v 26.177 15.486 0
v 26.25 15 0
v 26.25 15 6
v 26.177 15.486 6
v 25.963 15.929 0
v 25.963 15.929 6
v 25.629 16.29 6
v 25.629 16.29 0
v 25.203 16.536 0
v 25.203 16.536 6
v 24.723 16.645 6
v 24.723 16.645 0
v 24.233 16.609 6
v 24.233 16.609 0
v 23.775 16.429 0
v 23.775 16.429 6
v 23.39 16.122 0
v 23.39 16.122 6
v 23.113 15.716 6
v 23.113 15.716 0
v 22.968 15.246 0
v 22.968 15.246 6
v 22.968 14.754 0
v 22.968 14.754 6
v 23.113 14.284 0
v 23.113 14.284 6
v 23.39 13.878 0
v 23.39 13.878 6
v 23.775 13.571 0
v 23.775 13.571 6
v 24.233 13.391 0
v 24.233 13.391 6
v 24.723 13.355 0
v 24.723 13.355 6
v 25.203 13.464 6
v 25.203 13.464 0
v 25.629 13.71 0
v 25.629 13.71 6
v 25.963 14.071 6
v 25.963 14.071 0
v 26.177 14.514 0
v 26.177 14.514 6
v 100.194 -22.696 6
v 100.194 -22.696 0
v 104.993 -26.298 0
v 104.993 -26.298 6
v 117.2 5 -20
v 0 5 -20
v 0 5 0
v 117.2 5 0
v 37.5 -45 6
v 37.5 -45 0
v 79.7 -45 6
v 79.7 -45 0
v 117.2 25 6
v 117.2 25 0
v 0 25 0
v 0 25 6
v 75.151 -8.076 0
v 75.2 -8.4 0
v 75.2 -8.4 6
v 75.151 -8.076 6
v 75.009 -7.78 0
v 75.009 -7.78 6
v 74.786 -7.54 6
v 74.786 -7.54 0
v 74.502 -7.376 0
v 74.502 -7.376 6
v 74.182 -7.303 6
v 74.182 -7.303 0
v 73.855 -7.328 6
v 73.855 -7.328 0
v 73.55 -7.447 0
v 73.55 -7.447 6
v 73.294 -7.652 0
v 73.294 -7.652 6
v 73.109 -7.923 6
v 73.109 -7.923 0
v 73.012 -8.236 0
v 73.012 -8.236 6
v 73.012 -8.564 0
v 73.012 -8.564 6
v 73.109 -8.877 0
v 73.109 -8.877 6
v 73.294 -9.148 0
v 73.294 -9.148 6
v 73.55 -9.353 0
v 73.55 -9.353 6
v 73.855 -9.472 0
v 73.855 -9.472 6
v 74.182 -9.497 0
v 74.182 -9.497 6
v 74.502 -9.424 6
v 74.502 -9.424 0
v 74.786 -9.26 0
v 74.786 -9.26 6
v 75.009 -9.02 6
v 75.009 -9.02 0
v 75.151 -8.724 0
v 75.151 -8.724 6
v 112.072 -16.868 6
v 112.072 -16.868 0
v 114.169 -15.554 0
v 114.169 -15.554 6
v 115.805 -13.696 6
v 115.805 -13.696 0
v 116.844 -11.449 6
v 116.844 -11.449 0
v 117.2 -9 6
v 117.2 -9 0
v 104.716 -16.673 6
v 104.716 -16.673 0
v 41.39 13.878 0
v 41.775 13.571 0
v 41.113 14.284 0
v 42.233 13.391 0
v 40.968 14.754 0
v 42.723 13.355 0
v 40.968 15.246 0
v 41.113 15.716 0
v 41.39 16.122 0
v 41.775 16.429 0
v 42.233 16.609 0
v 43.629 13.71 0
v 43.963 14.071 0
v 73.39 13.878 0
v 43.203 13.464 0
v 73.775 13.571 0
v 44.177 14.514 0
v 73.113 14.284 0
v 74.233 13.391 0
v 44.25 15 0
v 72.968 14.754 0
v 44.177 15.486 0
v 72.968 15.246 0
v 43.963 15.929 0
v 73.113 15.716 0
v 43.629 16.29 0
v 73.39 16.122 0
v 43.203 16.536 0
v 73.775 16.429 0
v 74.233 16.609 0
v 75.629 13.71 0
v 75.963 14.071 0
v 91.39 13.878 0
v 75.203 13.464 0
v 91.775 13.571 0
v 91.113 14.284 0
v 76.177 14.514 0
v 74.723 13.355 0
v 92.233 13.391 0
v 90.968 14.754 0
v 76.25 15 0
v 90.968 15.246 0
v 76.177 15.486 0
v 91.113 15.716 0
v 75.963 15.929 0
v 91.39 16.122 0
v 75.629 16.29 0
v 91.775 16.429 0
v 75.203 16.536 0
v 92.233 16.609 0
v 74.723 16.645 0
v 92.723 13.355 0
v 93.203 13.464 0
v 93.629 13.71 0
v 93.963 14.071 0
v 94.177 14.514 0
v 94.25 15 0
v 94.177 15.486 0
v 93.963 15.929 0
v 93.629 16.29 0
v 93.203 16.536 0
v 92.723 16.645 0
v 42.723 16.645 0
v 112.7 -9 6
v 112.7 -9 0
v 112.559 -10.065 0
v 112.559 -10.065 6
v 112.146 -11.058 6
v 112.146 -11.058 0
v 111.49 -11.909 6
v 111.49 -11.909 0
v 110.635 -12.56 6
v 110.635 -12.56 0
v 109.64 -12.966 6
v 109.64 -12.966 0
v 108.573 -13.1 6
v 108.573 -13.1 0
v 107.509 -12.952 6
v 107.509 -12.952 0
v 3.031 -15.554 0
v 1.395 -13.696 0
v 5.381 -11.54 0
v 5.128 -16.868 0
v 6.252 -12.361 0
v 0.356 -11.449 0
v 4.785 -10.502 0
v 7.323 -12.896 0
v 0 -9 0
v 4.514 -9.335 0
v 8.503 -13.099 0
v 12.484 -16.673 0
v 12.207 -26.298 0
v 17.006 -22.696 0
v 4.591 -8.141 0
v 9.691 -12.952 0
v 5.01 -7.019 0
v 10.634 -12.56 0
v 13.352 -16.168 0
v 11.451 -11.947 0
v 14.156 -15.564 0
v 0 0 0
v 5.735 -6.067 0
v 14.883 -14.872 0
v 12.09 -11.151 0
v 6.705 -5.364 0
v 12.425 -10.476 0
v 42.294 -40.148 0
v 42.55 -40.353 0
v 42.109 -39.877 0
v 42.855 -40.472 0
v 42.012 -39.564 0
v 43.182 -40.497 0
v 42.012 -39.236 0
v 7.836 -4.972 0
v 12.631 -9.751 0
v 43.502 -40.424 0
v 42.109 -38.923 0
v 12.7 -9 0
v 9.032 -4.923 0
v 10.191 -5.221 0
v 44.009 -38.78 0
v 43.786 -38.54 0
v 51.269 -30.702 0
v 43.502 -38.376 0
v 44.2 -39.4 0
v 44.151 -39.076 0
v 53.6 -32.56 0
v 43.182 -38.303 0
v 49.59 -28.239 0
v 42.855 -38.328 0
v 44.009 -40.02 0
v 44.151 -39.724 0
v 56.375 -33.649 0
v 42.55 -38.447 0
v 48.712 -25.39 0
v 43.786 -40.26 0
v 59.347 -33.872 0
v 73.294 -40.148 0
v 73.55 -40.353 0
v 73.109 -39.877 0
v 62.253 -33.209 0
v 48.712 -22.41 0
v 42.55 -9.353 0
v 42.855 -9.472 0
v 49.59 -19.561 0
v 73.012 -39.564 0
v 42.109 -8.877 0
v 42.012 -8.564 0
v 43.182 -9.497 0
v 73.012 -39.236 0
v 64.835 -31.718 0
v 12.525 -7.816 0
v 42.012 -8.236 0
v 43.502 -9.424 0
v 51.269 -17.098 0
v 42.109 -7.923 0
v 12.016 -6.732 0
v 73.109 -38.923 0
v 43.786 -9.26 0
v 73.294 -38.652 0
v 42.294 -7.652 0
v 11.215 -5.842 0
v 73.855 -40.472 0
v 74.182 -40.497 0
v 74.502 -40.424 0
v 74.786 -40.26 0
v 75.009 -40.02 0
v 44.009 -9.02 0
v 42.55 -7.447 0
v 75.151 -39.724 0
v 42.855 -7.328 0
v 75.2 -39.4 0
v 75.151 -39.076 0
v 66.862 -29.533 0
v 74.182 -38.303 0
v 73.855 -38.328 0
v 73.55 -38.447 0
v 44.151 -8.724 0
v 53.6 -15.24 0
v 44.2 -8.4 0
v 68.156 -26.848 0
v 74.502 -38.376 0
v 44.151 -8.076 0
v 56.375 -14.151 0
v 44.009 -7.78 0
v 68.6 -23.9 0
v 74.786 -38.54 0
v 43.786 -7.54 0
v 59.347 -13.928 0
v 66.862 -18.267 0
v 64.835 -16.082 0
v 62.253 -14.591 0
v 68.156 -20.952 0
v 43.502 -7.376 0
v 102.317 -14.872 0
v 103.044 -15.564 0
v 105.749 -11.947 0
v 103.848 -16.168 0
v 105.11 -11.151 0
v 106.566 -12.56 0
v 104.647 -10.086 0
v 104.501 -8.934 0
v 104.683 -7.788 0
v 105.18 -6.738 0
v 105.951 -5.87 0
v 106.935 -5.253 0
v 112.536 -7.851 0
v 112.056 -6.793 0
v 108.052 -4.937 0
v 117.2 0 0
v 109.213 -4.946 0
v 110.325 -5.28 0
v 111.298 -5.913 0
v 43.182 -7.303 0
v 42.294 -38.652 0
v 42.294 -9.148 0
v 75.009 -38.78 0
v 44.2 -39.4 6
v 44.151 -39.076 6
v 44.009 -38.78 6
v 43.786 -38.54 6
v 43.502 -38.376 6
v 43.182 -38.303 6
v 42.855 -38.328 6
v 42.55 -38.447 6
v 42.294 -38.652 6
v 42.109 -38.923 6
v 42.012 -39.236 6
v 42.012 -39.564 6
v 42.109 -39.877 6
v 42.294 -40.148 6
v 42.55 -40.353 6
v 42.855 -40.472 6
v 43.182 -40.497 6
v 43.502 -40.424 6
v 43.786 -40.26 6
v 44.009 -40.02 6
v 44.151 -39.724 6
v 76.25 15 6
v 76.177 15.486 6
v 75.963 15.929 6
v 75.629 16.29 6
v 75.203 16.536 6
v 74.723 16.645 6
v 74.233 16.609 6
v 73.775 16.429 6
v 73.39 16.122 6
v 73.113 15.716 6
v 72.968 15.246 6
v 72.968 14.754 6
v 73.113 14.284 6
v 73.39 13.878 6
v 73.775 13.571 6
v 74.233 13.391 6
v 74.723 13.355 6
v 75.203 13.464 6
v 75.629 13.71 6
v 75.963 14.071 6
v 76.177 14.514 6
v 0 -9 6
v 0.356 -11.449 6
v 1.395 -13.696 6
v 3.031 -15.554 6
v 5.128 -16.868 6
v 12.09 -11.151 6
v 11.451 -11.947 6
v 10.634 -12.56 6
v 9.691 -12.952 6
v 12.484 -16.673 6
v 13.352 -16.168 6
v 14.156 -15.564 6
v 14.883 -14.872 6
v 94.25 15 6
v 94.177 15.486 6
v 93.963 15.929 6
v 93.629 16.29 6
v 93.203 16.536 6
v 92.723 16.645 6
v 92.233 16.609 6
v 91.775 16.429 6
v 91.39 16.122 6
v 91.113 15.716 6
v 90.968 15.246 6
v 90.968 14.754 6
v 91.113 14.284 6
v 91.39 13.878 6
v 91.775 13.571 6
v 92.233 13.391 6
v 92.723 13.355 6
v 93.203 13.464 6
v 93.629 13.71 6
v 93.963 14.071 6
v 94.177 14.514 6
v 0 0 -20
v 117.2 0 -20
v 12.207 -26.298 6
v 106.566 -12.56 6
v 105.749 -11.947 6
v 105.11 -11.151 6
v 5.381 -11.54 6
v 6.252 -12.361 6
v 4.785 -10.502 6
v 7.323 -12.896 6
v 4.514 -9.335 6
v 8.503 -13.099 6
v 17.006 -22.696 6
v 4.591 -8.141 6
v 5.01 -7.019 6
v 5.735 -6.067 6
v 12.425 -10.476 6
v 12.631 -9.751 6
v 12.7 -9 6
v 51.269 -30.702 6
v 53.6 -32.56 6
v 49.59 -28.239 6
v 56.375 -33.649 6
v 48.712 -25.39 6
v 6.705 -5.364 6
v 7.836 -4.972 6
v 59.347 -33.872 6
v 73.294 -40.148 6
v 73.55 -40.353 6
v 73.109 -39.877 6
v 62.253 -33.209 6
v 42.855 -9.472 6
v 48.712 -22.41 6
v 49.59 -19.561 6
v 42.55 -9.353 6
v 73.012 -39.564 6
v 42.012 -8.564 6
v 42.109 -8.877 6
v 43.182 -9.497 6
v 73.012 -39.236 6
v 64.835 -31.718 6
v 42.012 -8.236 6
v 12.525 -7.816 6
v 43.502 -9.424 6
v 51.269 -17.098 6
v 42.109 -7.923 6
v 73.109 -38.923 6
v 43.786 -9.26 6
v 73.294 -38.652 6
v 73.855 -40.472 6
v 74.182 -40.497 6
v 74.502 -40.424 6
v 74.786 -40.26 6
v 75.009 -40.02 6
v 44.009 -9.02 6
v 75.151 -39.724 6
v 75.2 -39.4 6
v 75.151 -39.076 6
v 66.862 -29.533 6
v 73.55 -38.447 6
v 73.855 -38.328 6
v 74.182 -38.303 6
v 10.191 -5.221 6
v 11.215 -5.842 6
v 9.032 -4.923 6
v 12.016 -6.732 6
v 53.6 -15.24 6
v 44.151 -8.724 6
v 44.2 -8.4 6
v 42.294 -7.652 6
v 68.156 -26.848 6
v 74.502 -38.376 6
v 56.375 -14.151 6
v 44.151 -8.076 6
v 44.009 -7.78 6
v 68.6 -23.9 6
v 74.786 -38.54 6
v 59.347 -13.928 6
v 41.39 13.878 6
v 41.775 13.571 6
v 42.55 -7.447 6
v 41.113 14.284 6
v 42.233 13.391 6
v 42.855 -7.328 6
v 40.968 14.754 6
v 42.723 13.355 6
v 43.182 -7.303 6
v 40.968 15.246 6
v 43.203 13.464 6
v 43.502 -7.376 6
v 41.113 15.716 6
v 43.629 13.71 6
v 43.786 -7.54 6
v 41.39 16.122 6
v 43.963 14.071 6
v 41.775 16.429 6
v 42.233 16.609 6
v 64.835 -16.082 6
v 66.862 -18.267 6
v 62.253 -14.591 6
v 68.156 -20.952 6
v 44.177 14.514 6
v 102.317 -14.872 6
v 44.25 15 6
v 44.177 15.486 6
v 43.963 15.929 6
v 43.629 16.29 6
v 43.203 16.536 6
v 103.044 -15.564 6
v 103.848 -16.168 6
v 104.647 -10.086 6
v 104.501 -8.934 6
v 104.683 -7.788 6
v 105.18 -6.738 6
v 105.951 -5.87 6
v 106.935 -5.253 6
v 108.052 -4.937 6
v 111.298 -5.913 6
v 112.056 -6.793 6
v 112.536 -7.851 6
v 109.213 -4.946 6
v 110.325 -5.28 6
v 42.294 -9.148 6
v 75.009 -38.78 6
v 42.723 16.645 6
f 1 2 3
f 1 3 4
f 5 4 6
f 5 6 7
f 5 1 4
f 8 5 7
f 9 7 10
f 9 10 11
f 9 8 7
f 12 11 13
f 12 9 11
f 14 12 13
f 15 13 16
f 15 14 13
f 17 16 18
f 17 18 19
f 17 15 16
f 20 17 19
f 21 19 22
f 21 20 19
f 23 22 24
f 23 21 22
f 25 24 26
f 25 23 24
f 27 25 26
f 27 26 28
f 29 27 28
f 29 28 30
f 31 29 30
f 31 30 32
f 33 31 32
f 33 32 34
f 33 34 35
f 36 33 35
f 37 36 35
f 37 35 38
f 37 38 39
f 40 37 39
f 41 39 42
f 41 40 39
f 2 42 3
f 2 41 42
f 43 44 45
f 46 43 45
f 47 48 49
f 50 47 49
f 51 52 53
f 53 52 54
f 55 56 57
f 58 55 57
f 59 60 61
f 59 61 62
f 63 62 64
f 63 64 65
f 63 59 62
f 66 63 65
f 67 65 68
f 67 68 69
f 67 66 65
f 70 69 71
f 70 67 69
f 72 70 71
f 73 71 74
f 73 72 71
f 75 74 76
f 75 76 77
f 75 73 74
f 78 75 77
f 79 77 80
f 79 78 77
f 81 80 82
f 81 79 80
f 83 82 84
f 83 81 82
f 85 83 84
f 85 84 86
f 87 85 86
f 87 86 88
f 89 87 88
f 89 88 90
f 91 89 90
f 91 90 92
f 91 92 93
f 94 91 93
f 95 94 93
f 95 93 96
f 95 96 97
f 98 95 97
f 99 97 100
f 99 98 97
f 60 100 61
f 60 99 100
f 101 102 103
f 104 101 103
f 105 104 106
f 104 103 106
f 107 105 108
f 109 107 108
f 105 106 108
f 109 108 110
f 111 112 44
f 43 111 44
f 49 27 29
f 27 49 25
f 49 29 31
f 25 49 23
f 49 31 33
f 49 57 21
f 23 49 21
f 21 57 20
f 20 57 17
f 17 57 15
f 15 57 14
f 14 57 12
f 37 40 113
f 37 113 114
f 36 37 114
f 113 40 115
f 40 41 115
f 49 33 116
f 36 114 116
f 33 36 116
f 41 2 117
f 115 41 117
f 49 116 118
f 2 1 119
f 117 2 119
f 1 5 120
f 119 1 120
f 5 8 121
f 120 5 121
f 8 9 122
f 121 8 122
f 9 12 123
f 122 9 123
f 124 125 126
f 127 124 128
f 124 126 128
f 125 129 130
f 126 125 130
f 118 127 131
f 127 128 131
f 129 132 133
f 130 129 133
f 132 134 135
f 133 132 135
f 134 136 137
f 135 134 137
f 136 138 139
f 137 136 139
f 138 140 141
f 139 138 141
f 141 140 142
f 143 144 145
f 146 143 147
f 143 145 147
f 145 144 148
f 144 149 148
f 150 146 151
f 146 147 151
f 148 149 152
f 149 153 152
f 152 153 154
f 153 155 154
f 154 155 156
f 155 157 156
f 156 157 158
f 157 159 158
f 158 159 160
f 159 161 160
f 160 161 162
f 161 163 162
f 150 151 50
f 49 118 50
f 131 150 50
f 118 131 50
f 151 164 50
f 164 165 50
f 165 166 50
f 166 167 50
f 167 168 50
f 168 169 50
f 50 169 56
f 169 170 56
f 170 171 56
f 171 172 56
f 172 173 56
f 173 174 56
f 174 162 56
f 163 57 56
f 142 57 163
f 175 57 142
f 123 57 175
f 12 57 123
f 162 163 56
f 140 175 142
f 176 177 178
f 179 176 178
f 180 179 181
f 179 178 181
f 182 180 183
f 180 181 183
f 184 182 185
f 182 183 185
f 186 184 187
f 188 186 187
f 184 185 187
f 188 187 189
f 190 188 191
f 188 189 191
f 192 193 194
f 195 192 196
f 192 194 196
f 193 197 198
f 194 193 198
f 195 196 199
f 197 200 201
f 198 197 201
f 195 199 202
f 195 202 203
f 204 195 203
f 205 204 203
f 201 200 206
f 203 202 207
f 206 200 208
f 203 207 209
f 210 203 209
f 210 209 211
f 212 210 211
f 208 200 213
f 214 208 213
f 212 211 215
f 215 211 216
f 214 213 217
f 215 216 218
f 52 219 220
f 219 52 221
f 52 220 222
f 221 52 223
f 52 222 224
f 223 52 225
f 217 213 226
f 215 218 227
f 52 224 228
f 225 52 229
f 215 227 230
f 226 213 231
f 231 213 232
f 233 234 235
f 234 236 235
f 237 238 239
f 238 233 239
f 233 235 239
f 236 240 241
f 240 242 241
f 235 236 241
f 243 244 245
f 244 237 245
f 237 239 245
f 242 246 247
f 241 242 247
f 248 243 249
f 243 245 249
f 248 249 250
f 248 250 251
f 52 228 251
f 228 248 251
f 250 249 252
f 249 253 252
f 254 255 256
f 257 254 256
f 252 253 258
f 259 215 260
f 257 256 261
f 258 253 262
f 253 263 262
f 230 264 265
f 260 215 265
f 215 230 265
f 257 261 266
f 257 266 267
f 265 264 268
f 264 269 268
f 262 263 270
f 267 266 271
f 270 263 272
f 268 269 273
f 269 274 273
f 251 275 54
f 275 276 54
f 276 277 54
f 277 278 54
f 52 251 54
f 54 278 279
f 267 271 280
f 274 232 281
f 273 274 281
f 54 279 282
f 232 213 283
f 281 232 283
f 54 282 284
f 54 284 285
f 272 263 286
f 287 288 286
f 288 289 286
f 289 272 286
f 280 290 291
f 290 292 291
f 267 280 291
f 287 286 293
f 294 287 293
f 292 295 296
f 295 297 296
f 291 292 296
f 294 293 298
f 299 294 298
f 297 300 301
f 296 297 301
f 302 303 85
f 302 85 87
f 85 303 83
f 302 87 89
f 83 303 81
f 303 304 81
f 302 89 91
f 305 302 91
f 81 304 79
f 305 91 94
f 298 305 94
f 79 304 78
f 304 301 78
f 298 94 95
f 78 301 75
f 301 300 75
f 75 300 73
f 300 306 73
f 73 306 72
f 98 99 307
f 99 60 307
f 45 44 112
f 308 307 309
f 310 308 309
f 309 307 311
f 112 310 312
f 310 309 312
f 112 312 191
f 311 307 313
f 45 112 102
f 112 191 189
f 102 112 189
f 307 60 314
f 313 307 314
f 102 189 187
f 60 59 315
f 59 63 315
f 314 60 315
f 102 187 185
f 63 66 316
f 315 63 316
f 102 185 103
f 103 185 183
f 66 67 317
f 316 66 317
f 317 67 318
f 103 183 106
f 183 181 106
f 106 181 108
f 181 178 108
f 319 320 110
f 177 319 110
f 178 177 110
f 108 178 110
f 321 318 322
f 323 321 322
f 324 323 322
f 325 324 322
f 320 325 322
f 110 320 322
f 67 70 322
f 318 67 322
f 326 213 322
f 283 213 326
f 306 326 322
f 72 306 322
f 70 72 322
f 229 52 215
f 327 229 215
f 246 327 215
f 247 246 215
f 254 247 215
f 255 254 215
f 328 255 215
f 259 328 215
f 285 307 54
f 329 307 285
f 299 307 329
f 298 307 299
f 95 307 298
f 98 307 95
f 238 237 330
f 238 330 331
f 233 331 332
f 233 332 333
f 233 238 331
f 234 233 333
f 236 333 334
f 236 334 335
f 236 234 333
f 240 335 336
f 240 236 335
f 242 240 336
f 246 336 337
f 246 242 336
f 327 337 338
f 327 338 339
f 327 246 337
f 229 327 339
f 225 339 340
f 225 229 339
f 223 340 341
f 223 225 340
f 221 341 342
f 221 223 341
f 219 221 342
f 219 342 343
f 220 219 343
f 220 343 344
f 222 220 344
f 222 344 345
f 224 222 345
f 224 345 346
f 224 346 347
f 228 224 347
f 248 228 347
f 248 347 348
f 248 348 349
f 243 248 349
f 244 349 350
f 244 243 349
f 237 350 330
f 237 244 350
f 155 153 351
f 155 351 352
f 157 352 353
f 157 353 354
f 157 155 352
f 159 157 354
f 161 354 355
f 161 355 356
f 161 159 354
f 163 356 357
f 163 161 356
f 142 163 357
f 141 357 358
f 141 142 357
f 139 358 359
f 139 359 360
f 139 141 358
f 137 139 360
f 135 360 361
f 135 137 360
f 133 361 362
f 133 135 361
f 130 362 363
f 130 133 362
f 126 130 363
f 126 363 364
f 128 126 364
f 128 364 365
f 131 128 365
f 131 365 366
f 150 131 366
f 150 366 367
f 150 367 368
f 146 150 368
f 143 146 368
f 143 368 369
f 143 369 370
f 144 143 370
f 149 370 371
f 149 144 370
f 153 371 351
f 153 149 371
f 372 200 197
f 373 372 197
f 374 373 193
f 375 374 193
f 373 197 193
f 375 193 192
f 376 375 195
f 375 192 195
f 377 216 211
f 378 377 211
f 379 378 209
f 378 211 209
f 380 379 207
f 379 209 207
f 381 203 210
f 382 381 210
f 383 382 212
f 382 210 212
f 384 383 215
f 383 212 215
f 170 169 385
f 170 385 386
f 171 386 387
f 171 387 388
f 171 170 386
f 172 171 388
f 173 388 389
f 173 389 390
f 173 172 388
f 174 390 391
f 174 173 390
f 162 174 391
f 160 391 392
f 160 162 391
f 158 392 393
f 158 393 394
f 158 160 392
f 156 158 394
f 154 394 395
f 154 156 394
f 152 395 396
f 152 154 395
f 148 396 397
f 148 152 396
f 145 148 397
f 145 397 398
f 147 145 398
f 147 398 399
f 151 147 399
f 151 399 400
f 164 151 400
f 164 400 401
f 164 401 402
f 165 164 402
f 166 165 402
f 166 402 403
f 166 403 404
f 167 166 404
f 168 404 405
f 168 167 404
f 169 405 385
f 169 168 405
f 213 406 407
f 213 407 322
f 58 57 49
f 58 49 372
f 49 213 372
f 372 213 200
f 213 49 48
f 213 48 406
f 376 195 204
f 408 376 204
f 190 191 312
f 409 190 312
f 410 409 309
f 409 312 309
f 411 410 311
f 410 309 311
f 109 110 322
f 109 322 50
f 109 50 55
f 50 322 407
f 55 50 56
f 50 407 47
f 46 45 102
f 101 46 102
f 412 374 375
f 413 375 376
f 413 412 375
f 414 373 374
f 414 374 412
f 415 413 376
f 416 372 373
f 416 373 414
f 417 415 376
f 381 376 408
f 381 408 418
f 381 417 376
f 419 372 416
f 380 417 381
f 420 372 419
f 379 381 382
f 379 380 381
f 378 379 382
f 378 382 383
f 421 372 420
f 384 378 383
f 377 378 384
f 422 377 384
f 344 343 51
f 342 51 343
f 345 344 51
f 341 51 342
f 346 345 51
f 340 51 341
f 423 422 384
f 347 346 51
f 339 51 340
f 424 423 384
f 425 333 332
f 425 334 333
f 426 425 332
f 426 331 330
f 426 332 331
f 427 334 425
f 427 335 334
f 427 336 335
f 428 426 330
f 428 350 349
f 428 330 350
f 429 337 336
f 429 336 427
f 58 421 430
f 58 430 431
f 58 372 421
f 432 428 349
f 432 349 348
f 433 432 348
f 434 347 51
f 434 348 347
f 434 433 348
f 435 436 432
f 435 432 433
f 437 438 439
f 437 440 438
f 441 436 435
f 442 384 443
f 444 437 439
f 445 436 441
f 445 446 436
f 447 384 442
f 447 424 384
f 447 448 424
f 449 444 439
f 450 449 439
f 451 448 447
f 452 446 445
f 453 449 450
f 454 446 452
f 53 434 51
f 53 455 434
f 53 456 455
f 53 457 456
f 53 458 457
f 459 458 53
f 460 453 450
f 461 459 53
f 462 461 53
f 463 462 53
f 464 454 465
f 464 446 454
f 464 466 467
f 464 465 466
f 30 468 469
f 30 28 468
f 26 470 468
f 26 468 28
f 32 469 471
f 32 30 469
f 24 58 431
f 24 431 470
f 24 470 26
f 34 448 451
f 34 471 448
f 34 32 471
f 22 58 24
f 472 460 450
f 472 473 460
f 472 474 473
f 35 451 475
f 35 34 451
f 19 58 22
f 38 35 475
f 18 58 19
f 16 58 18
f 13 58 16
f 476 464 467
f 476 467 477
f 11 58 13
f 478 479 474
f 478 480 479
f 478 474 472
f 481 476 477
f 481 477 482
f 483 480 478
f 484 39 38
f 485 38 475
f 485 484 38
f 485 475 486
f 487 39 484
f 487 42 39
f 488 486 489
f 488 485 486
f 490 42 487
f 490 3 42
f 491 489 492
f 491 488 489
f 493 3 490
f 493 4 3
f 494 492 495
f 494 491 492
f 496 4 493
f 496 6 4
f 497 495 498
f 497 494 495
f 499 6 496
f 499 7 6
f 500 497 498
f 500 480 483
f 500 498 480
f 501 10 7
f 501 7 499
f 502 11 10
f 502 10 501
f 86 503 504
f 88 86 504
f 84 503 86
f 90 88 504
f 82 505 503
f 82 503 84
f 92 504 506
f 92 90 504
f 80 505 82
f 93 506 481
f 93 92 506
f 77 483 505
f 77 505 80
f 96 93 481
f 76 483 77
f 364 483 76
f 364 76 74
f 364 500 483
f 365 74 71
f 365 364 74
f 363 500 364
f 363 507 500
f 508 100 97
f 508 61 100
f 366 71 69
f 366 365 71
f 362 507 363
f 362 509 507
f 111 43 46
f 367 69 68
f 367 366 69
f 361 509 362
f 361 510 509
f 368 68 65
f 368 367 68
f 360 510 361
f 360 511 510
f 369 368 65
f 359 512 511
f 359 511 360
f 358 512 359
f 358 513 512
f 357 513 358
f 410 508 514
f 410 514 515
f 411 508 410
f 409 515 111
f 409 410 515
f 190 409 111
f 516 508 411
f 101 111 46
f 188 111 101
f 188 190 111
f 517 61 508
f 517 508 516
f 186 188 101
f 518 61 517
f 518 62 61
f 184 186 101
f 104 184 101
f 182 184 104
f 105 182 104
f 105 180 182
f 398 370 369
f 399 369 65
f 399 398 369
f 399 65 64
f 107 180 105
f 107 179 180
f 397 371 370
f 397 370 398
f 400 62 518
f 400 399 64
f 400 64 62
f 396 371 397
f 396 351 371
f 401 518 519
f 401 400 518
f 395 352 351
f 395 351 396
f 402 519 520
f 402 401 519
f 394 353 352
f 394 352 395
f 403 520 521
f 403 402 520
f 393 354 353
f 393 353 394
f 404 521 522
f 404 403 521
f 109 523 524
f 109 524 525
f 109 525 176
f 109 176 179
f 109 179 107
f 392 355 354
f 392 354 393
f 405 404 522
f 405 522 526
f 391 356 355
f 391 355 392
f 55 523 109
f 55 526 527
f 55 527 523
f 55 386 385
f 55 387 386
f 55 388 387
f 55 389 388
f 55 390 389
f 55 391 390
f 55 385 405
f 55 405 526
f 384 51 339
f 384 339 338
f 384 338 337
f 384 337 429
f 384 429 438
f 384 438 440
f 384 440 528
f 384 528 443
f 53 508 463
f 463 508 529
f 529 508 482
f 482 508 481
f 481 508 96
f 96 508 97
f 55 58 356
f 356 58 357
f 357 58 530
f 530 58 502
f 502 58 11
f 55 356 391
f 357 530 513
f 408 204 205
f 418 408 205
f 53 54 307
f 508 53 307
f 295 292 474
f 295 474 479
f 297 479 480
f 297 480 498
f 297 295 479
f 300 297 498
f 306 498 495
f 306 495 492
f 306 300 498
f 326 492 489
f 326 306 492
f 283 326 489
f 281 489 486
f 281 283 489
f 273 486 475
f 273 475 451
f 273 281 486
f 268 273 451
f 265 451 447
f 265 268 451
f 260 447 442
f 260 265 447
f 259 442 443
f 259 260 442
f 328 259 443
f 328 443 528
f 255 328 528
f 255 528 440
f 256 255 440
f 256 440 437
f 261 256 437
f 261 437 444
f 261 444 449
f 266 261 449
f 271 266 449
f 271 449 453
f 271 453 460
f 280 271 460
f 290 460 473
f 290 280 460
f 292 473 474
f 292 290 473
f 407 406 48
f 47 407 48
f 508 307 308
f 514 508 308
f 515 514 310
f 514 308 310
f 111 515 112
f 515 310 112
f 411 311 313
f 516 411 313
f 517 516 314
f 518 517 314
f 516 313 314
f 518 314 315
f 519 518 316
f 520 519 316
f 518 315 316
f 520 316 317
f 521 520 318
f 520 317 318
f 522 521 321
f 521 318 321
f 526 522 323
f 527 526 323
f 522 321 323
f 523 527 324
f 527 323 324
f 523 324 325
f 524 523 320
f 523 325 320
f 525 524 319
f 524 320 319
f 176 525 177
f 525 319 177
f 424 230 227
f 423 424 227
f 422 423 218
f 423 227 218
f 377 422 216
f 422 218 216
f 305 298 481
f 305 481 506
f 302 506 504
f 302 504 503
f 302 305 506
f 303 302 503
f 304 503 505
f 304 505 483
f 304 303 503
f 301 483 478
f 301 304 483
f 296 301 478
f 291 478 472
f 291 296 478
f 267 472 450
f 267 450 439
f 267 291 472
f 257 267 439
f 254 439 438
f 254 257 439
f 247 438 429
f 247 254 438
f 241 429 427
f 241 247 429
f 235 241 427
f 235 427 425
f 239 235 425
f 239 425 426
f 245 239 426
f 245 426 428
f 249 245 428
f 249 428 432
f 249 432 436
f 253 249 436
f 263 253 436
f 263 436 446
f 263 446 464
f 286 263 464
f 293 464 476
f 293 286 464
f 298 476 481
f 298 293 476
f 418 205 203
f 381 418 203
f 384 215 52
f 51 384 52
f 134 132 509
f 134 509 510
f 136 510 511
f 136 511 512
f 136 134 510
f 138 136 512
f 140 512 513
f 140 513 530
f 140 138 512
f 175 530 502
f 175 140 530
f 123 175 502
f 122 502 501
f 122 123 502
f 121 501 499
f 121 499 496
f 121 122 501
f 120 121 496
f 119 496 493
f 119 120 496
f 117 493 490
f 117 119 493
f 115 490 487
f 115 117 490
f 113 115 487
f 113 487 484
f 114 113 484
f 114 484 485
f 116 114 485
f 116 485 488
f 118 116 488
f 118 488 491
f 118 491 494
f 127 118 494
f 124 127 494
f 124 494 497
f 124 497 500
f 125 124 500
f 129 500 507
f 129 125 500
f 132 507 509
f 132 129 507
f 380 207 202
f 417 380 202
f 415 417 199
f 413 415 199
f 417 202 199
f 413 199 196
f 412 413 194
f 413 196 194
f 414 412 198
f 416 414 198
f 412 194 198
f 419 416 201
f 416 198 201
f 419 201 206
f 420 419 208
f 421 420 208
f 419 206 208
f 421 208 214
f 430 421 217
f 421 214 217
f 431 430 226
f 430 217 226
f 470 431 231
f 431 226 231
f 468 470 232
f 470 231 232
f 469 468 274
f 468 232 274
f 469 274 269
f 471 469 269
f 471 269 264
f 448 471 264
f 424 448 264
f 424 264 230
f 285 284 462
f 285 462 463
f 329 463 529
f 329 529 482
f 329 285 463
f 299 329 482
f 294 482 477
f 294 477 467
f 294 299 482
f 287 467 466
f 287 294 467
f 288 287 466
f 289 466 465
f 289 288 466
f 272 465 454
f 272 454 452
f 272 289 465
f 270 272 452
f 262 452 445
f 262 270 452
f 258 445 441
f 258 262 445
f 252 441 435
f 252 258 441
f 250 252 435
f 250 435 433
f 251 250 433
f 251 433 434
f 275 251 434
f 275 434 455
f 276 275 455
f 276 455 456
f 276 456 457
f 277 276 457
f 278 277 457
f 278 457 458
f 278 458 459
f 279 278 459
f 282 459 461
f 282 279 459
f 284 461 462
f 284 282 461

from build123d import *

# Parameters (mm, degrees)
F0_R     = 1.1
F0_R_2   = 10
F0_R_3   = 1.65
F1_DEPTH = 6
F2_W     = 5
F2_H     = 20
F3_DEPTH = 117.2


with BuildPart() as f1:
    # F0 (on Top) → F1 (new body)
    with BuildSketch(Plane.XY):
        with BuildLine():
            Line((0, 25), (0, 0))
            Line((0, 0), (0, -9))
            ThreePointArc((0, -9), (8.6, -0.4), (17.2, -9))
            ThreePointArc((17.2, -9), (16.5999275153, -12.1561305026), (14.8834512211, -14.8718174999))
            Line((14.8834512211, -14.8718174999), (37.5, -45))
            Line((37.5, -45), (79.7, -45))
            Line((79.7, -45), (102.3165487789, -14.8718174999))
            ThreePointArc((102.3165487789, -14.8718174999), (105.4438694974, -1.0000724847), (117.2, -9))
            Line((117.2, -9), (117.2, 25))
            Line((117.2, 25), (0, 25))
        make_face()
        with Locations((43.1, -39.4)):
            Circle(F0_R, mode=Mode.SUBTRACT)
        with Locations((74.1, -39.4)):
            Circle(F0_R, mode=Mode.SUBTRACT)
        with Locations((58.6, -23.9)):
            Circle(F0_R_2, mode=Mode.SUBTRACT)
        with Locations((43.1, -8.4)):
            Circle(F0_R, mode=Mode.SUBTRACT)
        with Locations((24.6, 15)):
            Circle(F0_R_3, mode=Mode.SUBTRACT)
        with Locations((42.6, 15)):
            Circle(F0_R_3, mode=Mode.SUBTRACT)
        with Locations((74.1, -8.4)):
            Circle(F0_R, mode=Mode.SUBTRACT)
        with Locations((74.6, 15)):
            Circle(F0_R_3, mode=Mode.SUBTRACT)
        with Locations((92.6, 15)):
            Circle(F0_R_3, mode=Mode.SUBTRACT)
        with BuildLine():
            ThreePointArc((17.2, -9), (8.6, -0.4), (0, -9))
            ThreePointArc((0, -9), (1.3952892231, -13.6959708922), (5.1284052606, -16.8681656036))
            ThreePointArc((5.1284052606, -16.8681656036), (8.8282621536, -17.5969701866), (12.484231675, -16.6728576355))
            Line((12.484231675, -16.6728576355), (9.6911672785, -12.9521328381))
            ThreePointArc((9.6911672785, -12.9521328381), (5.3378085708, -6.5164325902), (12.7, -9))
            ThreePointArc((12.7, -9), (12.5446537225, -10.1179029518), (12.0903868245, -11.1510927026))
            Line((12.0903868245, -11.1510927026), (14.8834512211, -14.8718174999))
            ThreePointArc((14.8834512211, -14.8718174999), (16.5999275153, -12.1561305026), (17.2, -9))
        make_face()
        with BuildLine():
            ThreePointArc((12.484231675, -16.6728576355), (8.8282621536, -17.5969701866), (5.1284052606, -16.8681656036))
            Line((5.1284052606, -16.8681656036), (12.2074985246, -26.2984379178))
            Line((12.2074985246, -26.2984379178), (17.0059376167, -22.6963576466))
            Line((17.0059376167, -22.6963576466), (12.484231675, -16.6728576355))
        make_face()
        with BuildLine():
            ThreePointArc((112.0715947394, -16.8681656036), (115.8047107769, -13.6959708922), (117.2, -9))
            ThreePointArc((117.2, -9), (105.4438694974, -1.0000724847), (102.3165487789, -14.8718174999))
            Line((102.3165487789, -14.8718174999), (105.1096131755, -11.1510927026))
            ThreePointArc((105.1096131755, -11.1510927026), (107.4820970482, -5.0553462775), (112.7, -9))
            ThreePointArc((112.7, -9), (111.0835674098, -12.2621914292), (107.5088327215, -12.9521328381))
            Line((107.5088327215, -12.9521328381), (104.715768325, -16.6728576355))
            ThreePointArc((104.715768325, -16.6728576355), (108.3717378464, -17.5969701866), (112.0715947394, -16.8681656036))
        make_face()
        with BuildLine():
            ThreePointArc((12.484231675, -16.6728576355), (13.762981722, -15.8777626986), (14.8834512211, -14.8718174999))
            Line((14.8834512211, -14.8718174999), (12.0903868245, -11.1510927026))
            ThreePointArc((12.0903868245, -11.1510927026), (11.0614215186, -12.2789333796), (9.6911672785, -12.9521328381))
            Line((9.6911672785, -12.9521328381), (12.484231675, -16.6728576355))
        make_face()
        with BuildLine():
            Line((105.1096131755, -11.1510927026), (102.3165487789, -14.8718174999))
            ThreePointArc((102.3165487789, -14.8718174999), (103.437018278, -15.8777626986), (104.715768325, -16.6728576355))
            Line((104.715768325, -16.6728576355), (107.5088327215, -12.9521328381))
            ThreePointArc((107.5088327215, -12.9521328381), (106.1385784814, -12.2789333796), (105.1096131755, -11.1510927026))
        make_face()
        with BuildLine():
            Line((104.9925014754, -26.2984379178), (112.0715947394, -16.8681656036))
            ThreePointArc((112.0715947394, -16.8681656036), (108.3717378464, -17.5969701866), (104.715768325, -16.6728576355))
            Line((104.715768325, -16.6728576355), (100.1940623833, -22.6963576466))
            Line((100.1940623833, -22.6963576466), (104.9925014754, -26.2984379178))
        make_face()
    extrude(amount=F1_DEPTH)

    # F2 (on Right) → F3 (join)
    with BuildSketch(Plane.YZ):
        with Locations((2.5, -10)):
            Rectangle(F2_W, F2_H)
    extrude(amount=F3_DEPTH)


solid = f1.part
